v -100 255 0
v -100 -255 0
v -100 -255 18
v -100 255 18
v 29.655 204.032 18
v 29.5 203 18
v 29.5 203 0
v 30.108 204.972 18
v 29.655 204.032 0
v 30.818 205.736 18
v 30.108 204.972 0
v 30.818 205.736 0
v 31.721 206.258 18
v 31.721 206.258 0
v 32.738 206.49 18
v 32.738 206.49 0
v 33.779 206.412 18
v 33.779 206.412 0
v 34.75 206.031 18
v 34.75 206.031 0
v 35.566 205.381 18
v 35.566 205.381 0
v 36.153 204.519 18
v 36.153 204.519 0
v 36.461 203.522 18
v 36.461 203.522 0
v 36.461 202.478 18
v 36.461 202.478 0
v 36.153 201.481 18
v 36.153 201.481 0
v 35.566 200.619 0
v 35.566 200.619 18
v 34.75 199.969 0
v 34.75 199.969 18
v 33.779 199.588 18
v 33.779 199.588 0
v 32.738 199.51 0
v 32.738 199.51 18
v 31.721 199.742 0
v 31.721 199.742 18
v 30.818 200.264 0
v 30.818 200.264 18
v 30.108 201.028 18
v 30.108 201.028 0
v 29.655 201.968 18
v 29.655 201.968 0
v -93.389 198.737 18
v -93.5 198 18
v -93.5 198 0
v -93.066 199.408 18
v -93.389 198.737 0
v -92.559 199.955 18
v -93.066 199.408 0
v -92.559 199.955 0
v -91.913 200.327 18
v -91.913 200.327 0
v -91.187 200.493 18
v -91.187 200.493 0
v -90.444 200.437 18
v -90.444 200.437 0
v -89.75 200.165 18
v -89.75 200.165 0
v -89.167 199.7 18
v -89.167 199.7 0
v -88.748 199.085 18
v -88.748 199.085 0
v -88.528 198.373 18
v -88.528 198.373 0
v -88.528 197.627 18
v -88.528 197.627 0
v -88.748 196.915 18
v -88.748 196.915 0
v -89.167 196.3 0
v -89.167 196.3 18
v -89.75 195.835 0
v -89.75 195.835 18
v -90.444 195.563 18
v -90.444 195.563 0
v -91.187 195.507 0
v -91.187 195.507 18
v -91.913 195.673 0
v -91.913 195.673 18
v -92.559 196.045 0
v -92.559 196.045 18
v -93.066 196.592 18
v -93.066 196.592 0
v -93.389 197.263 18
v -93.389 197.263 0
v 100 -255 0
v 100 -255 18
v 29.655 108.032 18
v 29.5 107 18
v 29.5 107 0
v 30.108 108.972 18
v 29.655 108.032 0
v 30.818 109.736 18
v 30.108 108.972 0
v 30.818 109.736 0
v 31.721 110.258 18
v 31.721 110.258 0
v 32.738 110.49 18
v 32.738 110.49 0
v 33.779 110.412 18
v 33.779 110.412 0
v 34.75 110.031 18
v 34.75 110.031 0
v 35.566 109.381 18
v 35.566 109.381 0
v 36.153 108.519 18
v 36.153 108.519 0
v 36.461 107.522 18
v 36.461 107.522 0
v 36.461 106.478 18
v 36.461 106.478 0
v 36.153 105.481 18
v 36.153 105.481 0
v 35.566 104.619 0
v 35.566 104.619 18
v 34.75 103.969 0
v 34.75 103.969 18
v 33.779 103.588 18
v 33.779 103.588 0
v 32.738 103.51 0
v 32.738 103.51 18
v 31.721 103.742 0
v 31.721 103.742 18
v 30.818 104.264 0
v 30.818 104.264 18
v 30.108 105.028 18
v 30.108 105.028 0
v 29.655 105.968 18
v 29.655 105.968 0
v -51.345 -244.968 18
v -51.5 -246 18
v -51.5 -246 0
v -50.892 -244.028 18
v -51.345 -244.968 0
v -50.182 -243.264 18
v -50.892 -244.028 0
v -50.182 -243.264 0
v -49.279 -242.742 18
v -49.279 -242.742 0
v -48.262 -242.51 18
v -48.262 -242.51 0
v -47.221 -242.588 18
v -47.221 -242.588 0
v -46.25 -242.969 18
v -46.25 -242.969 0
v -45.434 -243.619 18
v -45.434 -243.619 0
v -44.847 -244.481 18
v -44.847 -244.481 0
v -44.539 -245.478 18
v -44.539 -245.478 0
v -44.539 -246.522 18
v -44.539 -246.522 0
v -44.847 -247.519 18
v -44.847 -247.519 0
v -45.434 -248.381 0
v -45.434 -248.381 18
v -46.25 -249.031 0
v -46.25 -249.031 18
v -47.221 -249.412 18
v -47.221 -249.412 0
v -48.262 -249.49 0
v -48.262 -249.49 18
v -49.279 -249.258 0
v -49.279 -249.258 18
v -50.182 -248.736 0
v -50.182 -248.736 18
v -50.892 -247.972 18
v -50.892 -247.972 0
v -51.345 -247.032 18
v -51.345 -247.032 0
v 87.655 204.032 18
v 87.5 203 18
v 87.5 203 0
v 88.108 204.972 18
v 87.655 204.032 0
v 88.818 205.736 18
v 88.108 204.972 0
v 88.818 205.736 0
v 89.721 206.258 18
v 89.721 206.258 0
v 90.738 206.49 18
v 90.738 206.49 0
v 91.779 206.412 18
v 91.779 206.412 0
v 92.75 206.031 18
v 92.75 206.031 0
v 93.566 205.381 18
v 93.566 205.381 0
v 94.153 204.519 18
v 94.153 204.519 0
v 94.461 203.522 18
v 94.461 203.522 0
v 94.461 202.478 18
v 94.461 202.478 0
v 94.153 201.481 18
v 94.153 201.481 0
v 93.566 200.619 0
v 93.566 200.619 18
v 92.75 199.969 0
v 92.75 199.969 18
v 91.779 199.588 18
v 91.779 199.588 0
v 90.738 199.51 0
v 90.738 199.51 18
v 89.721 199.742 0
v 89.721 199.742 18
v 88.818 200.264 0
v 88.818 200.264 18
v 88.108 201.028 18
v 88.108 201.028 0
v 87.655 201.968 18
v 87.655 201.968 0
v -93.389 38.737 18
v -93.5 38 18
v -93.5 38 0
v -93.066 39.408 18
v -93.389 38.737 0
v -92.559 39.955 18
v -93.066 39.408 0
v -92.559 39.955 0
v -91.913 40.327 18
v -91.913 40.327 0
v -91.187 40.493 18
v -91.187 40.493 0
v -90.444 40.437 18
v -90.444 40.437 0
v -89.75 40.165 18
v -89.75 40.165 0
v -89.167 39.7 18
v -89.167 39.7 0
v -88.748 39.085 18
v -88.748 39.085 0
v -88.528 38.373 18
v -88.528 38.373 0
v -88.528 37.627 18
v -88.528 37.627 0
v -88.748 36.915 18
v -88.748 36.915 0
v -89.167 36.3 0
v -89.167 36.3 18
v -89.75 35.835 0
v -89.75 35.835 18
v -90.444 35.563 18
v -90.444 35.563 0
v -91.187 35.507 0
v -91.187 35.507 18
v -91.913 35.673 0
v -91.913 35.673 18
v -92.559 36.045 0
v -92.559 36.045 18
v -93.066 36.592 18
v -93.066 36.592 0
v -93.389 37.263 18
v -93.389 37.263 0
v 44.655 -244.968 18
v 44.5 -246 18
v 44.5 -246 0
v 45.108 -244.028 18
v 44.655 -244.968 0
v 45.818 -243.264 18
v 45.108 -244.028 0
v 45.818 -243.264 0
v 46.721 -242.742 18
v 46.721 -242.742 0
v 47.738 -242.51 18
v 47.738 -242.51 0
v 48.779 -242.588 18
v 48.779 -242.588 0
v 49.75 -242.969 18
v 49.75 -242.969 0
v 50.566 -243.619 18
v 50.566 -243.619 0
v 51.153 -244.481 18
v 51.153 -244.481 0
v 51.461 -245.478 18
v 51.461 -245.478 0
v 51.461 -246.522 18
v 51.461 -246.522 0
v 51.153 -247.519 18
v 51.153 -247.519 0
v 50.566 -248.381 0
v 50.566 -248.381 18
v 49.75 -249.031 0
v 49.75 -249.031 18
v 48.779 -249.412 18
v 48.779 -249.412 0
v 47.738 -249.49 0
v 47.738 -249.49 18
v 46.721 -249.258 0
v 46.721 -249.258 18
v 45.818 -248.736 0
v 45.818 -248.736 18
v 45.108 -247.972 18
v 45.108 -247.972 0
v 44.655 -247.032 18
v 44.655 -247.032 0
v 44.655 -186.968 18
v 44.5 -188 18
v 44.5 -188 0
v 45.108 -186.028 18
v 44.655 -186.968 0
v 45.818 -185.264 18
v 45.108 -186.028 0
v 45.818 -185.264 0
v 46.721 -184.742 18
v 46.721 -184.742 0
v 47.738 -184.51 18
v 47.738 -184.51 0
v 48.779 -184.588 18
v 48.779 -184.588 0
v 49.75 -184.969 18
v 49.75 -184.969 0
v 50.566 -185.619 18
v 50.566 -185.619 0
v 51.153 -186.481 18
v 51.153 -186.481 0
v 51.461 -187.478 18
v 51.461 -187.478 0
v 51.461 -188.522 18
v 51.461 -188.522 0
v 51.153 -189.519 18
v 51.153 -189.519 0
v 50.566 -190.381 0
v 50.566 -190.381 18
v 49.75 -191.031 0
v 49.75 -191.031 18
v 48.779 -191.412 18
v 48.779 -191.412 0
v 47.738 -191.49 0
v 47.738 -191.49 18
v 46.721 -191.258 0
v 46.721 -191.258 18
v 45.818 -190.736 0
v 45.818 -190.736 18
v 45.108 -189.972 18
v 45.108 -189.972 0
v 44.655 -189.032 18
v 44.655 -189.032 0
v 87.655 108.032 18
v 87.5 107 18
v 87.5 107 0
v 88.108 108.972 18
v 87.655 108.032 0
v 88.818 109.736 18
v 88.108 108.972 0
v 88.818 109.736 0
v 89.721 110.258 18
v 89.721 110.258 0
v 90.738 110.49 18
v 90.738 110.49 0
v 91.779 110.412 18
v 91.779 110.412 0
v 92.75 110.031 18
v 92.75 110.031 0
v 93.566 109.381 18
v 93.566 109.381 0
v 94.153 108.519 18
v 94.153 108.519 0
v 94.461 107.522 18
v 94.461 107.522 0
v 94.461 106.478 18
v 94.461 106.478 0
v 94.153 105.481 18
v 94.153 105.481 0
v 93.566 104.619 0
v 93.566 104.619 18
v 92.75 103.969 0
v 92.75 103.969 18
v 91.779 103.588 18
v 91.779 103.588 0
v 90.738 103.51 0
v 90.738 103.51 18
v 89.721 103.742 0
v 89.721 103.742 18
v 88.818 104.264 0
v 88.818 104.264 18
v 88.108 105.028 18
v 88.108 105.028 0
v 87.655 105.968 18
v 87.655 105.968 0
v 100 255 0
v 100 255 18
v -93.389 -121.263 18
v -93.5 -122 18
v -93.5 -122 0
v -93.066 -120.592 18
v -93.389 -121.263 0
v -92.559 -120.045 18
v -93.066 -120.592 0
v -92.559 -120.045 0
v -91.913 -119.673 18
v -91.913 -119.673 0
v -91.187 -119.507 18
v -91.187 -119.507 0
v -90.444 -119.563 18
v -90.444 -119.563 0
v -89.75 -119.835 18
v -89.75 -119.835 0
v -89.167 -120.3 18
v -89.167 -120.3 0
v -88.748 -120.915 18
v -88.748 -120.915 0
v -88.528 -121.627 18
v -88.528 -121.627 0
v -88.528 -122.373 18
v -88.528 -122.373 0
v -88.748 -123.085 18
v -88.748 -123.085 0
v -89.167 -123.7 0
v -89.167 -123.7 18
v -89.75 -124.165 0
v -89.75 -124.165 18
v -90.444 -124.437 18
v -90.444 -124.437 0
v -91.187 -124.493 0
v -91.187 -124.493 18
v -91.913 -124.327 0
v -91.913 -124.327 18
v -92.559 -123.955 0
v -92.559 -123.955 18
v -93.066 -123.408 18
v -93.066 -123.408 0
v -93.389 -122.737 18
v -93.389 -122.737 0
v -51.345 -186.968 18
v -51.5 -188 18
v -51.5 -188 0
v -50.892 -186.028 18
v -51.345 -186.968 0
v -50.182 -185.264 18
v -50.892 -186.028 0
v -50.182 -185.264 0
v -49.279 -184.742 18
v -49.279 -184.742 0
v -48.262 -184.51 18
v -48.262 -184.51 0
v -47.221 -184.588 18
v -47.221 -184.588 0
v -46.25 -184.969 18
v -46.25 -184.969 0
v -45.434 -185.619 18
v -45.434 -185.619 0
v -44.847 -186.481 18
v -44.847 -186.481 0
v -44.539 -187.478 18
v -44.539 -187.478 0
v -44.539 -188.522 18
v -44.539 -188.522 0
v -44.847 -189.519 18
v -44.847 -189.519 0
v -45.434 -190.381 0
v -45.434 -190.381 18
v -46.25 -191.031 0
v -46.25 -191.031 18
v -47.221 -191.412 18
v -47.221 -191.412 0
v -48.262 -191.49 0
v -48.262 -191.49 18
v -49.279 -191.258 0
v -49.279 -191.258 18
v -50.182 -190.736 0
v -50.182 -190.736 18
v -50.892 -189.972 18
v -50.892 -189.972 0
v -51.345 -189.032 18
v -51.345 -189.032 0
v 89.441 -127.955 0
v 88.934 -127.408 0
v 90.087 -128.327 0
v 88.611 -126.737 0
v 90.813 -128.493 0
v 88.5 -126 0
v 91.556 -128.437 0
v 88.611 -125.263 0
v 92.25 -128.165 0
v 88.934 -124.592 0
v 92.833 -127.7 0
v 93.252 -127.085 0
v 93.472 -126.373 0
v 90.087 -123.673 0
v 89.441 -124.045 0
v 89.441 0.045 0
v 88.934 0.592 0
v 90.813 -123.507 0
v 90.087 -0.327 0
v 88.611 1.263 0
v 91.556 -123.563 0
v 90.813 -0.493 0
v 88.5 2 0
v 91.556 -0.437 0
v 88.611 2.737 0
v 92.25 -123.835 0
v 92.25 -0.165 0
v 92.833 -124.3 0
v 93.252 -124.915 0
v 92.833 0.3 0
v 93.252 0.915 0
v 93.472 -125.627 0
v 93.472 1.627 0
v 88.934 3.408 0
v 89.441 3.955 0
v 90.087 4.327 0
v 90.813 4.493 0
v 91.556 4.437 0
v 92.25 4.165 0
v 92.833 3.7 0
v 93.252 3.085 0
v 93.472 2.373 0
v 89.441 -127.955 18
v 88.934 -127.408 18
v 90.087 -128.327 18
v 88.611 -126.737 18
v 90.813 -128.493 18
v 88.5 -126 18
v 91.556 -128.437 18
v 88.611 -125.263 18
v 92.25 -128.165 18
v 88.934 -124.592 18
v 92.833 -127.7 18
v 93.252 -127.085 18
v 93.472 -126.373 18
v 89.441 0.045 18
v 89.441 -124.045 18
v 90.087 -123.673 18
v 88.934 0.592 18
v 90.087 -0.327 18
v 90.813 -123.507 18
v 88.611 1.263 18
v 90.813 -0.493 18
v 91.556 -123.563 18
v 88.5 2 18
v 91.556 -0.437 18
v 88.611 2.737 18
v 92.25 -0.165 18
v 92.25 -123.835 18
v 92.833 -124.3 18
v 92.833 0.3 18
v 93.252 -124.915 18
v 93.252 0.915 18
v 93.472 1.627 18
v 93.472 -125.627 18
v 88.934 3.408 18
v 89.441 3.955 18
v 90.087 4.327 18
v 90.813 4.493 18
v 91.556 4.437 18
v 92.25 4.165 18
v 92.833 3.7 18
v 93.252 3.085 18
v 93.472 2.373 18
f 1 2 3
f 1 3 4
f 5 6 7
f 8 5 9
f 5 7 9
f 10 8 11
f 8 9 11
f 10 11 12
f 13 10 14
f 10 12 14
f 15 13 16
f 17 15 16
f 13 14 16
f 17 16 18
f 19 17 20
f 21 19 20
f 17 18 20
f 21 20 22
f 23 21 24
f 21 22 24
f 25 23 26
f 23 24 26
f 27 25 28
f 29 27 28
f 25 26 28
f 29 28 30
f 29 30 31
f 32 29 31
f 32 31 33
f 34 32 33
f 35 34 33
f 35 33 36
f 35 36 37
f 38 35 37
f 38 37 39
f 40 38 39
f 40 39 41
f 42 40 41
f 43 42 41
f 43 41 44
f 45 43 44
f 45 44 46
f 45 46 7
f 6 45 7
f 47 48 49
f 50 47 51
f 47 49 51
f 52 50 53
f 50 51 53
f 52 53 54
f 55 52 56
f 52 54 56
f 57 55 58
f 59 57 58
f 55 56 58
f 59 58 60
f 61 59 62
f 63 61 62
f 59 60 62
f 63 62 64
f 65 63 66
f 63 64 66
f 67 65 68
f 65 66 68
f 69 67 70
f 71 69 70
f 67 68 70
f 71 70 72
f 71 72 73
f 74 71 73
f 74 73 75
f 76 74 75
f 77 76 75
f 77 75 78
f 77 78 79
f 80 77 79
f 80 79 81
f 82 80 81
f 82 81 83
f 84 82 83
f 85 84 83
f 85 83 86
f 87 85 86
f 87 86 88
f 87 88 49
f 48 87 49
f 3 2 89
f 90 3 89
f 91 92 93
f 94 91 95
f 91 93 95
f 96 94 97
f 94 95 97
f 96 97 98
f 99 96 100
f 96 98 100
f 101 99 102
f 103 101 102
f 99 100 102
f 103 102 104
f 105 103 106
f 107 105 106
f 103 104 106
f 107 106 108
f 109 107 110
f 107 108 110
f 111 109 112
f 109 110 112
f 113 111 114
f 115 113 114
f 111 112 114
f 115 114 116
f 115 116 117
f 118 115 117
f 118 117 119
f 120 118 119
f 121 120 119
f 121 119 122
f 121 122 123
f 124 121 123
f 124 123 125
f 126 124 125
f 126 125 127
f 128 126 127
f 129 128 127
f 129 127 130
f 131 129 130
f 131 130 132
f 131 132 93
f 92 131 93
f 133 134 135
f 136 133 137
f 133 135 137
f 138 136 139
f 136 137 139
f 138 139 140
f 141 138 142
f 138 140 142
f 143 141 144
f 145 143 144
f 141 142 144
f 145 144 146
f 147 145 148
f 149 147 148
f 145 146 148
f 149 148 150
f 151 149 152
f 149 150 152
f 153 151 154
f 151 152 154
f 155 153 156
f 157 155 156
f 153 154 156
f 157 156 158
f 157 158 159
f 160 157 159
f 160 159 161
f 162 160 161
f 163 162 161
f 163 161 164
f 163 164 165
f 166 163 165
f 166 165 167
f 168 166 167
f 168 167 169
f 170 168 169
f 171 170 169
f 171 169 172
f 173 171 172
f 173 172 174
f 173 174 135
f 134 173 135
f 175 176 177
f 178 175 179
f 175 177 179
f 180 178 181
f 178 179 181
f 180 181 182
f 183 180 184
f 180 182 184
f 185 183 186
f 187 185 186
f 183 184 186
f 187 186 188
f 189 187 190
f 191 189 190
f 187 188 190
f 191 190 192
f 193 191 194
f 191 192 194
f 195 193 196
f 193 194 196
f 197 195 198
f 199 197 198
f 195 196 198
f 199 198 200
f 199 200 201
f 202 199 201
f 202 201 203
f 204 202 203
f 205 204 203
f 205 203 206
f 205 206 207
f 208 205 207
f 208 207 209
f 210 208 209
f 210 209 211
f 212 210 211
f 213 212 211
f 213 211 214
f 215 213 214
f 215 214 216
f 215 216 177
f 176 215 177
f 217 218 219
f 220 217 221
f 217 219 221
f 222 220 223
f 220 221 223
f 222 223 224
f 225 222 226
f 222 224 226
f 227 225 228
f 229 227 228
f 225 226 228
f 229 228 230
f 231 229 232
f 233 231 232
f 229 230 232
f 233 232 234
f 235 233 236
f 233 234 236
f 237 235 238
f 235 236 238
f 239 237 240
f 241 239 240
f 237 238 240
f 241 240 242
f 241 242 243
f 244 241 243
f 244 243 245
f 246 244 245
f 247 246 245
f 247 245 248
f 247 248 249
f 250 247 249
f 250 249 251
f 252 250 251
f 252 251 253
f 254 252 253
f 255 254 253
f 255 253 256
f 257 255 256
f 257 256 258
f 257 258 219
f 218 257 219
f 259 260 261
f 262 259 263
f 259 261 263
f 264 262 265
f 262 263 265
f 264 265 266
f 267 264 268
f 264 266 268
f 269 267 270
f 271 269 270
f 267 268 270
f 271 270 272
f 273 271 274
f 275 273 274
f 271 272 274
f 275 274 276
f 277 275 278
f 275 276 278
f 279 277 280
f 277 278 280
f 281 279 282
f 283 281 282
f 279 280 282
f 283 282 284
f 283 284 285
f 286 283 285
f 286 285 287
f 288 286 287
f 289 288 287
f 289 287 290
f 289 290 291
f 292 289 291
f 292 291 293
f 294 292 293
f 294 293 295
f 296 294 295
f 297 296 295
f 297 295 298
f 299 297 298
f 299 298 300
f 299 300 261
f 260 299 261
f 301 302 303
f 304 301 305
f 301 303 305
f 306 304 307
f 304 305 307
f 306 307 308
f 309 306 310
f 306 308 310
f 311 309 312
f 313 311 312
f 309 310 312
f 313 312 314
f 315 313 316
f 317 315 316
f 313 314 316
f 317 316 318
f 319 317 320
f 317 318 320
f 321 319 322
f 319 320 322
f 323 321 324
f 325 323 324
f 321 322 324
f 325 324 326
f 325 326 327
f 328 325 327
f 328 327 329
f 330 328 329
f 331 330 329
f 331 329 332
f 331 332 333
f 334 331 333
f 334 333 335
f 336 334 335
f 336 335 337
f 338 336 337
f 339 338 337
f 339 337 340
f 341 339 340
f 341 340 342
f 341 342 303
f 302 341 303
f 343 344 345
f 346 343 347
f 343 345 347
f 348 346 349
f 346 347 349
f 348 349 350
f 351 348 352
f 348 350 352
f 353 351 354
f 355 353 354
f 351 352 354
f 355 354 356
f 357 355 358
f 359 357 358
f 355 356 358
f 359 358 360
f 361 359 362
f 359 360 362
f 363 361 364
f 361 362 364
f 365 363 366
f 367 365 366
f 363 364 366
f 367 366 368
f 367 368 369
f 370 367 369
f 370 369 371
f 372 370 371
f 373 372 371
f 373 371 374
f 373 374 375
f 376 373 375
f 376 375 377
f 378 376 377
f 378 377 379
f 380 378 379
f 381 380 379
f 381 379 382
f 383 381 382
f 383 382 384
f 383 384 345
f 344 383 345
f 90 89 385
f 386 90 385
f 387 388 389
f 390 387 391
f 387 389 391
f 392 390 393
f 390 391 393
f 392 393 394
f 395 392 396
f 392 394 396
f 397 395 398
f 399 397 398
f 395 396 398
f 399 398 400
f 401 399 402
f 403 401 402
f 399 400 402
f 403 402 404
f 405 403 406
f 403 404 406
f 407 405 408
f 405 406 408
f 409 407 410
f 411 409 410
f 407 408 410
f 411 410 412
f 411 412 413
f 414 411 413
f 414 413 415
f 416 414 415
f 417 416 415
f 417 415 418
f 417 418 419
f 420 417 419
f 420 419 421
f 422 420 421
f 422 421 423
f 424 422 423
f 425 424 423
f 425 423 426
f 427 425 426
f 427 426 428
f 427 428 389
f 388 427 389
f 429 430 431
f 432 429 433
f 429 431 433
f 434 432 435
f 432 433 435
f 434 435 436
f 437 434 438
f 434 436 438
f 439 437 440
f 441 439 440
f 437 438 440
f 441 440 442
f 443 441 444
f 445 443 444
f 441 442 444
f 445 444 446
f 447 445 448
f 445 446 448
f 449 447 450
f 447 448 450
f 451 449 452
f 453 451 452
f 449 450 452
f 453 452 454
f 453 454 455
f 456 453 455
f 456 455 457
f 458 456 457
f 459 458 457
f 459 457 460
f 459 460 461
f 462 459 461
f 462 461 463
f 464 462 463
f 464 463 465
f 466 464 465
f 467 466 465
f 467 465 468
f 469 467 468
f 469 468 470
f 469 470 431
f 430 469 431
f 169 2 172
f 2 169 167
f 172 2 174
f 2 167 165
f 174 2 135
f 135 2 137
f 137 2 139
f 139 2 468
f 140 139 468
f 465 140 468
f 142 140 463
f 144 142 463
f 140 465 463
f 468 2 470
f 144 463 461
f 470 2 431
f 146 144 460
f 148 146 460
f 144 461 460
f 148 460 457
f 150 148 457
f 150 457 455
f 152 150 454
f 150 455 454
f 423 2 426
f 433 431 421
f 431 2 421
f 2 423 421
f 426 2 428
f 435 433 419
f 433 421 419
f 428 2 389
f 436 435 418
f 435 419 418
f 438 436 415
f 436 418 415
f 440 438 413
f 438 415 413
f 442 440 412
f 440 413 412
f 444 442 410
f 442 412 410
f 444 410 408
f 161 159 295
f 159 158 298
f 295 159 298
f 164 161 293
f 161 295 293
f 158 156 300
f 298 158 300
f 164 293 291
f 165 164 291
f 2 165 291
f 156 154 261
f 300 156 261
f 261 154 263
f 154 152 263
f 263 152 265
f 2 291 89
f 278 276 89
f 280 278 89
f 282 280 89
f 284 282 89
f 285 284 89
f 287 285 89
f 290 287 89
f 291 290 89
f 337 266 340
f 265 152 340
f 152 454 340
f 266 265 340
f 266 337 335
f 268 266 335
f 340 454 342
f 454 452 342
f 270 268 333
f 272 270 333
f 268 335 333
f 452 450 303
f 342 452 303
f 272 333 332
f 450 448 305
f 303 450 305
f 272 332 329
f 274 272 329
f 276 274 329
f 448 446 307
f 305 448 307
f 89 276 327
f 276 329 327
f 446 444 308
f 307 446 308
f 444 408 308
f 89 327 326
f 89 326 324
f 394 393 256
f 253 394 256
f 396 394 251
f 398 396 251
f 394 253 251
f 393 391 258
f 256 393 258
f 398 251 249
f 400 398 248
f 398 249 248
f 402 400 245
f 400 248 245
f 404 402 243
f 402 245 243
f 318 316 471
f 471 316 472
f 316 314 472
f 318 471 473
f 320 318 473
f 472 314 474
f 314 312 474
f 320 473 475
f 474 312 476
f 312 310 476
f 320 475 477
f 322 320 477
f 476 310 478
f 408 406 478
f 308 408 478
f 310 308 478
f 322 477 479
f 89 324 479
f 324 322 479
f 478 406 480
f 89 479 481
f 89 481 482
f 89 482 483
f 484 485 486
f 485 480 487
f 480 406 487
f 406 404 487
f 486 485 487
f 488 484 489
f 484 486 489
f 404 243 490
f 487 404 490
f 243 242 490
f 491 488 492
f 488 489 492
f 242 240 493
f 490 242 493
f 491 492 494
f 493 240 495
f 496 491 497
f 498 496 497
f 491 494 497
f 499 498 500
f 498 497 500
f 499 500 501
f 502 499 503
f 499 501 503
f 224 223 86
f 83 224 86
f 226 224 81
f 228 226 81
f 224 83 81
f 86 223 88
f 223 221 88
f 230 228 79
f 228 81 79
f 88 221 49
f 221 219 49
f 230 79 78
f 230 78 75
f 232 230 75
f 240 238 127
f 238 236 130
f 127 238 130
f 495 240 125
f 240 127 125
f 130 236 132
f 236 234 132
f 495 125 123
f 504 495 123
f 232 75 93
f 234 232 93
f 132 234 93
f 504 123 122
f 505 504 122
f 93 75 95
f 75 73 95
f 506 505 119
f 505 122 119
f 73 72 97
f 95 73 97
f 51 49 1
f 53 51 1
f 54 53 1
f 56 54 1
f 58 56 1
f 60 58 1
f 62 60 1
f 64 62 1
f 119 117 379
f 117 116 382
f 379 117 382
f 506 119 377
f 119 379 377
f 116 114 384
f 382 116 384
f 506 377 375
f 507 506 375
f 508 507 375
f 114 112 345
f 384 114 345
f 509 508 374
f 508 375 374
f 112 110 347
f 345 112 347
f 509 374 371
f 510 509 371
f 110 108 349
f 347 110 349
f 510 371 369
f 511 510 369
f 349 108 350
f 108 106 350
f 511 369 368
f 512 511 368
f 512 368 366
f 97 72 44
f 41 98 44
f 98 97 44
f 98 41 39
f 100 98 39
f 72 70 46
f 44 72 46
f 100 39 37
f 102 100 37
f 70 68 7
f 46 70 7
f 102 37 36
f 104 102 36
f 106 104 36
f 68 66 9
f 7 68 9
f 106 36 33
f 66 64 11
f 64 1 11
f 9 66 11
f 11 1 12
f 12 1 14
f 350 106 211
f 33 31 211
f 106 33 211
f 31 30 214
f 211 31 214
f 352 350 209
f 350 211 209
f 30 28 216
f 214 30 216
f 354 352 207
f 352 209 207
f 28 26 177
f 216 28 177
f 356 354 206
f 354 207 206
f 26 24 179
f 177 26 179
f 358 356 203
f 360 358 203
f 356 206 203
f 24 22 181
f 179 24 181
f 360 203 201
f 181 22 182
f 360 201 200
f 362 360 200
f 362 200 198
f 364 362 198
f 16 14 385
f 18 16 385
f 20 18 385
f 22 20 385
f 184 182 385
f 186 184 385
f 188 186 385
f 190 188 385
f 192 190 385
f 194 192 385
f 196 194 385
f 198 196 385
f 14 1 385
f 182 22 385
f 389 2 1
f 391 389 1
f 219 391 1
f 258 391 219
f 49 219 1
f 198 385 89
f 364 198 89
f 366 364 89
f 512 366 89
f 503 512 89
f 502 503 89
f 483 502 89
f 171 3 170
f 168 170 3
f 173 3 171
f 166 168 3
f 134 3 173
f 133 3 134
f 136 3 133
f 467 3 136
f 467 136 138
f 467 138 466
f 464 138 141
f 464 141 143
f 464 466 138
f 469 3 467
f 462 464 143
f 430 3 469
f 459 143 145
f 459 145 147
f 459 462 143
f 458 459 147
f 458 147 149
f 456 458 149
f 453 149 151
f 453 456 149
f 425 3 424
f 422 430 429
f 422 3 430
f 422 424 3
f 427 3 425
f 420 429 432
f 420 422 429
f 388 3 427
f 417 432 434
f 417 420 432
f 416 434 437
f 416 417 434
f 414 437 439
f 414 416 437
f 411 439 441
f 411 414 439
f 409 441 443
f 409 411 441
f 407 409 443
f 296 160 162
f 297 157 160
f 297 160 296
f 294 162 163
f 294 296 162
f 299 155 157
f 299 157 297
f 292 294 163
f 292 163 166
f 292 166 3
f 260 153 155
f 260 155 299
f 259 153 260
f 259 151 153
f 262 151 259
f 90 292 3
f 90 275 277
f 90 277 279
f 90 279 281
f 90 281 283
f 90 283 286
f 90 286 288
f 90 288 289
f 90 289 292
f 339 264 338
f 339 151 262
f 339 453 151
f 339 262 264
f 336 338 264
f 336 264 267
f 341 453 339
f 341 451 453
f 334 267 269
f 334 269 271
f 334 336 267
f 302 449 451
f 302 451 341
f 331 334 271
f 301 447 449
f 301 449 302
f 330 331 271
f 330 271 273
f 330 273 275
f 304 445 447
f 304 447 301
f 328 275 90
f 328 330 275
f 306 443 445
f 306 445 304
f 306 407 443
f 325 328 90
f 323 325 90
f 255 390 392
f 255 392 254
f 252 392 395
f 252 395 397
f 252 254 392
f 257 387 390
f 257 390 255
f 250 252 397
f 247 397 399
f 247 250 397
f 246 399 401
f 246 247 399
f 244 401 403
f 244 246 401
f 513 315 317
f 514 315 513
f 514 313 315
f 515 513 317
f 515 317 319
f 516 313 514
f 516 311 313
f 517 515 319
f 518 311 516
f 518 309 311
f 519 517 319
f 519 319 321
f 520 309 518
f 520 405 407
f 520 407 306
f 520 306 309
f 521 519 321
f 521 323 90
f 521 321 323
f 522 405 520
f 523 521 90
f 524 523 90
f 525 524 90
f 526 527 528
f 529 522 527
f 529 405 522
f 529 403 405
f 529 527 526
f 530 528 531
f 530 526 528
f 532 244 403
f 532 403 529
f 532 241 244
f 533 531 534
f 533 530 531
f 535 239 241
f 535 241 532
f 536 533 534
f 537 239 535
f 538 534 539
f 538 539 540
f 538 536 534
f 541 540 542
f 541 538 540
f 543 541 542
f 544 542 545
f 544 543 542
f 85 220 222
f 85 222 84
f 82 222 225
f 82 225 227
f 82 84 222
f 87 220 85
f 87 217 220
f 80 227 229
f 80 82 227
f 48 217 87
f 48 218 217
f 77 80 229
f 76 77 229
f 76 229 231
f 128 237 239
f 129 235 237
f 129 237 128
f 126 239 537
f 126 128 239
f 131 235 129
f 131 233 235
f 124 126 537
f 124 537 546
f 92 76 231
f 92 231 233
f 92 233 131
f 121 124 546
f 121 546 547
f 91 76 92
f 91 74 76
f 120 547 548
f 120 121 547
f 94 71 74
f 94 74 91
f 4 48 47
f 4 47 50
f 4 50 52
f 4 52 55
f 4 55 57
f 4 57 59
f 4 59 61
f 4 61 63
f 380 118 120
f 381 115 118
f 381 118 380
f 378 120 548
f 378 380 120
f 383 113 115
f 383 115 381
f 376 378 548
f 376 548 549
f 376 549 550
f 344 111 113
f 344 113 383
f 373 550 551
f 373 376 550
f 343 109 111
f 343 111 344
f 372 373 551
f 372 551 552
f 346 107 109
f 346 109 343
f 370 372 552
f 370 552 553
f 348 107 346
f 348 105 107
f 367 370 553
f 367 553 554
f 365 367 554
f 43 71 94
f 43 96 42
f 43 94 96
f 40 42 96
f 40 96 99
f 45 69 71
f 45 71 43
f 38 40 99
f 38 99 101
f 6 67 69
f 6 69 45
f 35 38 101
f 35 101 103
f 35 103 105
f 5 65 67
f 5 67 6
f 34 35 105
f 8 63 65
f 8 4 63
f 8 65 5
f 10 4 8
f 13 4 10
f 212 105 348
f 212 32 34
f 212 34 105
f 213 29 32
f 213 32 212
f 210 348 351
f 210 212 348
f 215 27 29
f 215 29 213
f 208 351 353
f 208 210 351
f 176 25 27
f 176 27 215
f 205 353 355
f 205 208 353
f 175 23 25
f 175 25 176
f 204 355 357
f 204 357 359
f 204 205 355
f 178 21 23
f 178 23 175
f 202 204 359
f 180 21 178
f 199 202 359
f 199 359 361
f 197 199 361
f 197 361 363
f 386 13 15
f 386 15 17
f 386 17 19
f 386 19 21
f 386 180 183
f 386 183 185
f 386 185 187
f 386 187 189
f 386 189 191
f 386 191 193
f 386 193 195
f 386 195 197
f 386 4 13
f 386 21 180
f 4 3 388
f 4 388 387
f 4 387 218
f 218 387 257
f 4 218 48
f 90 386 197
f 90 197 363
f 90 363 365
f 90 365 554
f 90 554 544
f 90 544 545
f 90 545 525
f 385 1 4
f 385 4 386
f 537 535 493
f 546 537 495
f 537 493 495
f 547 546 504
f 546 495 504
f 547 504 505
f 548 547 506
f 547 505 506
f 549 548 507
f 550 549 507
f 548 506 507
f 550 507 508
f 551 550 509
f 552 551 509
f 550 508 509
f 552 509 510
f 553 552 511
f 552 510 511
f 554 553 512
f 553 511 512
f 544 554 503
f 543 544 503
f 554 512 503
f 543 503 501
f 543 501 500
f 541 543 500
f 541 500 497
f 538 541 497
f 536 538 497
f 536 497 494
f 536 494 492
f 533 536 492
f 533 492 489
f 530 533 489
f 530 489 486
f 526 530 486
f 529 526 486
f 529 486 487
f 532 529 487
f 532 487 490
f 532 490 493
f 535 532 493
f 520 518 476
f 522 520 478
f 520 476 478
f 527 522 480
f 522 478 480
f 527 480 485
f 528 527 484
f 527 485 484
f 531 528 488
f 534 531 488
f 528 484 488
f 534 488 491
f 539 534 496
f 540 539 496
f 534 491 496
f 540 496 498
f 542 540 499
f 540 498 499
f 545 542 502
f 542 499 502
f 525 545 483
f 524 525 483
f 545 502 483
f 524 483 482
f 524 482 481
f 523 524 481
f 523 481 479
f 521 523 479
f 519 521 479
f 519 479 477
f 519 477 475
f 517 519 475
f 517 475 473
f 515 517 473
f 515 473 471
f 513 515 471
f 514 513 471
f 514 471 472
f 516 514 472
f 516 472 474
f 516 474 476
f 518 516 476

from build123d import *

# Parameters (mm, degrees)
SKETCH1_W                = 200
SKETCH1_H                = 510
BOSS_EXTRUDE1_DEPTH      = 18
F_7_0_7_DIAMETER_HOLE1_D = 7
F_5_0_5_DIAMETER_HOLE1_D = 5
F_5_0_5_DIAMETER_HOLE2_D = 5
F_7_0_7_DIAMETER_HOLE2_D = 7


with BuildPart() as part:
    # Sketch1 → Boss-Extrude1 (new body)
    with BuildSketch(Plane.XY):
        Rectangle(SKETCH1_W, SKETCH1_H)
    extrude(amount=BOSS_EXTRUDE1_DEPTH)

    # Ø7.0 (7) Diameter Hole1 (through all)
    with Locations(Plane.XY.offset(18)):
        with Locations((33, 203), (33, 107), (91, 203), (91, 107)):
            Hole(F_7_0_7_DIAMETER_HOLE1_D / 2)

    # Ø5.0 (5) Diameter Hole1 (through all)
    with Locations(Plane.XY.offset(18)):
        with Locations((-91, 198), (-91, 38), (-91, -122)):
            Hole(F_5_0_5_DIAMETER_HOLE1_D / 2)

    # Ø5.0 (5) Diameter Hole2 (through all)
    with Locations(Plane.XY.offset(18)):
        with Locations((91, 2), (91, -126)):
            Hole(F_5_0_5_DIAMETER_HOLE2_D / 2)

    # Ø7.0 (7) Diameter Hole2 (through all)
    with Locations(Plane.XY.offset(18)):
        with Locations((48, -188), (-48, -188), (48, -246), (-48, -246)):
            Hole(F_7_0_7_DIAMETER_HOLE2_D / 2)


solid = part.part
